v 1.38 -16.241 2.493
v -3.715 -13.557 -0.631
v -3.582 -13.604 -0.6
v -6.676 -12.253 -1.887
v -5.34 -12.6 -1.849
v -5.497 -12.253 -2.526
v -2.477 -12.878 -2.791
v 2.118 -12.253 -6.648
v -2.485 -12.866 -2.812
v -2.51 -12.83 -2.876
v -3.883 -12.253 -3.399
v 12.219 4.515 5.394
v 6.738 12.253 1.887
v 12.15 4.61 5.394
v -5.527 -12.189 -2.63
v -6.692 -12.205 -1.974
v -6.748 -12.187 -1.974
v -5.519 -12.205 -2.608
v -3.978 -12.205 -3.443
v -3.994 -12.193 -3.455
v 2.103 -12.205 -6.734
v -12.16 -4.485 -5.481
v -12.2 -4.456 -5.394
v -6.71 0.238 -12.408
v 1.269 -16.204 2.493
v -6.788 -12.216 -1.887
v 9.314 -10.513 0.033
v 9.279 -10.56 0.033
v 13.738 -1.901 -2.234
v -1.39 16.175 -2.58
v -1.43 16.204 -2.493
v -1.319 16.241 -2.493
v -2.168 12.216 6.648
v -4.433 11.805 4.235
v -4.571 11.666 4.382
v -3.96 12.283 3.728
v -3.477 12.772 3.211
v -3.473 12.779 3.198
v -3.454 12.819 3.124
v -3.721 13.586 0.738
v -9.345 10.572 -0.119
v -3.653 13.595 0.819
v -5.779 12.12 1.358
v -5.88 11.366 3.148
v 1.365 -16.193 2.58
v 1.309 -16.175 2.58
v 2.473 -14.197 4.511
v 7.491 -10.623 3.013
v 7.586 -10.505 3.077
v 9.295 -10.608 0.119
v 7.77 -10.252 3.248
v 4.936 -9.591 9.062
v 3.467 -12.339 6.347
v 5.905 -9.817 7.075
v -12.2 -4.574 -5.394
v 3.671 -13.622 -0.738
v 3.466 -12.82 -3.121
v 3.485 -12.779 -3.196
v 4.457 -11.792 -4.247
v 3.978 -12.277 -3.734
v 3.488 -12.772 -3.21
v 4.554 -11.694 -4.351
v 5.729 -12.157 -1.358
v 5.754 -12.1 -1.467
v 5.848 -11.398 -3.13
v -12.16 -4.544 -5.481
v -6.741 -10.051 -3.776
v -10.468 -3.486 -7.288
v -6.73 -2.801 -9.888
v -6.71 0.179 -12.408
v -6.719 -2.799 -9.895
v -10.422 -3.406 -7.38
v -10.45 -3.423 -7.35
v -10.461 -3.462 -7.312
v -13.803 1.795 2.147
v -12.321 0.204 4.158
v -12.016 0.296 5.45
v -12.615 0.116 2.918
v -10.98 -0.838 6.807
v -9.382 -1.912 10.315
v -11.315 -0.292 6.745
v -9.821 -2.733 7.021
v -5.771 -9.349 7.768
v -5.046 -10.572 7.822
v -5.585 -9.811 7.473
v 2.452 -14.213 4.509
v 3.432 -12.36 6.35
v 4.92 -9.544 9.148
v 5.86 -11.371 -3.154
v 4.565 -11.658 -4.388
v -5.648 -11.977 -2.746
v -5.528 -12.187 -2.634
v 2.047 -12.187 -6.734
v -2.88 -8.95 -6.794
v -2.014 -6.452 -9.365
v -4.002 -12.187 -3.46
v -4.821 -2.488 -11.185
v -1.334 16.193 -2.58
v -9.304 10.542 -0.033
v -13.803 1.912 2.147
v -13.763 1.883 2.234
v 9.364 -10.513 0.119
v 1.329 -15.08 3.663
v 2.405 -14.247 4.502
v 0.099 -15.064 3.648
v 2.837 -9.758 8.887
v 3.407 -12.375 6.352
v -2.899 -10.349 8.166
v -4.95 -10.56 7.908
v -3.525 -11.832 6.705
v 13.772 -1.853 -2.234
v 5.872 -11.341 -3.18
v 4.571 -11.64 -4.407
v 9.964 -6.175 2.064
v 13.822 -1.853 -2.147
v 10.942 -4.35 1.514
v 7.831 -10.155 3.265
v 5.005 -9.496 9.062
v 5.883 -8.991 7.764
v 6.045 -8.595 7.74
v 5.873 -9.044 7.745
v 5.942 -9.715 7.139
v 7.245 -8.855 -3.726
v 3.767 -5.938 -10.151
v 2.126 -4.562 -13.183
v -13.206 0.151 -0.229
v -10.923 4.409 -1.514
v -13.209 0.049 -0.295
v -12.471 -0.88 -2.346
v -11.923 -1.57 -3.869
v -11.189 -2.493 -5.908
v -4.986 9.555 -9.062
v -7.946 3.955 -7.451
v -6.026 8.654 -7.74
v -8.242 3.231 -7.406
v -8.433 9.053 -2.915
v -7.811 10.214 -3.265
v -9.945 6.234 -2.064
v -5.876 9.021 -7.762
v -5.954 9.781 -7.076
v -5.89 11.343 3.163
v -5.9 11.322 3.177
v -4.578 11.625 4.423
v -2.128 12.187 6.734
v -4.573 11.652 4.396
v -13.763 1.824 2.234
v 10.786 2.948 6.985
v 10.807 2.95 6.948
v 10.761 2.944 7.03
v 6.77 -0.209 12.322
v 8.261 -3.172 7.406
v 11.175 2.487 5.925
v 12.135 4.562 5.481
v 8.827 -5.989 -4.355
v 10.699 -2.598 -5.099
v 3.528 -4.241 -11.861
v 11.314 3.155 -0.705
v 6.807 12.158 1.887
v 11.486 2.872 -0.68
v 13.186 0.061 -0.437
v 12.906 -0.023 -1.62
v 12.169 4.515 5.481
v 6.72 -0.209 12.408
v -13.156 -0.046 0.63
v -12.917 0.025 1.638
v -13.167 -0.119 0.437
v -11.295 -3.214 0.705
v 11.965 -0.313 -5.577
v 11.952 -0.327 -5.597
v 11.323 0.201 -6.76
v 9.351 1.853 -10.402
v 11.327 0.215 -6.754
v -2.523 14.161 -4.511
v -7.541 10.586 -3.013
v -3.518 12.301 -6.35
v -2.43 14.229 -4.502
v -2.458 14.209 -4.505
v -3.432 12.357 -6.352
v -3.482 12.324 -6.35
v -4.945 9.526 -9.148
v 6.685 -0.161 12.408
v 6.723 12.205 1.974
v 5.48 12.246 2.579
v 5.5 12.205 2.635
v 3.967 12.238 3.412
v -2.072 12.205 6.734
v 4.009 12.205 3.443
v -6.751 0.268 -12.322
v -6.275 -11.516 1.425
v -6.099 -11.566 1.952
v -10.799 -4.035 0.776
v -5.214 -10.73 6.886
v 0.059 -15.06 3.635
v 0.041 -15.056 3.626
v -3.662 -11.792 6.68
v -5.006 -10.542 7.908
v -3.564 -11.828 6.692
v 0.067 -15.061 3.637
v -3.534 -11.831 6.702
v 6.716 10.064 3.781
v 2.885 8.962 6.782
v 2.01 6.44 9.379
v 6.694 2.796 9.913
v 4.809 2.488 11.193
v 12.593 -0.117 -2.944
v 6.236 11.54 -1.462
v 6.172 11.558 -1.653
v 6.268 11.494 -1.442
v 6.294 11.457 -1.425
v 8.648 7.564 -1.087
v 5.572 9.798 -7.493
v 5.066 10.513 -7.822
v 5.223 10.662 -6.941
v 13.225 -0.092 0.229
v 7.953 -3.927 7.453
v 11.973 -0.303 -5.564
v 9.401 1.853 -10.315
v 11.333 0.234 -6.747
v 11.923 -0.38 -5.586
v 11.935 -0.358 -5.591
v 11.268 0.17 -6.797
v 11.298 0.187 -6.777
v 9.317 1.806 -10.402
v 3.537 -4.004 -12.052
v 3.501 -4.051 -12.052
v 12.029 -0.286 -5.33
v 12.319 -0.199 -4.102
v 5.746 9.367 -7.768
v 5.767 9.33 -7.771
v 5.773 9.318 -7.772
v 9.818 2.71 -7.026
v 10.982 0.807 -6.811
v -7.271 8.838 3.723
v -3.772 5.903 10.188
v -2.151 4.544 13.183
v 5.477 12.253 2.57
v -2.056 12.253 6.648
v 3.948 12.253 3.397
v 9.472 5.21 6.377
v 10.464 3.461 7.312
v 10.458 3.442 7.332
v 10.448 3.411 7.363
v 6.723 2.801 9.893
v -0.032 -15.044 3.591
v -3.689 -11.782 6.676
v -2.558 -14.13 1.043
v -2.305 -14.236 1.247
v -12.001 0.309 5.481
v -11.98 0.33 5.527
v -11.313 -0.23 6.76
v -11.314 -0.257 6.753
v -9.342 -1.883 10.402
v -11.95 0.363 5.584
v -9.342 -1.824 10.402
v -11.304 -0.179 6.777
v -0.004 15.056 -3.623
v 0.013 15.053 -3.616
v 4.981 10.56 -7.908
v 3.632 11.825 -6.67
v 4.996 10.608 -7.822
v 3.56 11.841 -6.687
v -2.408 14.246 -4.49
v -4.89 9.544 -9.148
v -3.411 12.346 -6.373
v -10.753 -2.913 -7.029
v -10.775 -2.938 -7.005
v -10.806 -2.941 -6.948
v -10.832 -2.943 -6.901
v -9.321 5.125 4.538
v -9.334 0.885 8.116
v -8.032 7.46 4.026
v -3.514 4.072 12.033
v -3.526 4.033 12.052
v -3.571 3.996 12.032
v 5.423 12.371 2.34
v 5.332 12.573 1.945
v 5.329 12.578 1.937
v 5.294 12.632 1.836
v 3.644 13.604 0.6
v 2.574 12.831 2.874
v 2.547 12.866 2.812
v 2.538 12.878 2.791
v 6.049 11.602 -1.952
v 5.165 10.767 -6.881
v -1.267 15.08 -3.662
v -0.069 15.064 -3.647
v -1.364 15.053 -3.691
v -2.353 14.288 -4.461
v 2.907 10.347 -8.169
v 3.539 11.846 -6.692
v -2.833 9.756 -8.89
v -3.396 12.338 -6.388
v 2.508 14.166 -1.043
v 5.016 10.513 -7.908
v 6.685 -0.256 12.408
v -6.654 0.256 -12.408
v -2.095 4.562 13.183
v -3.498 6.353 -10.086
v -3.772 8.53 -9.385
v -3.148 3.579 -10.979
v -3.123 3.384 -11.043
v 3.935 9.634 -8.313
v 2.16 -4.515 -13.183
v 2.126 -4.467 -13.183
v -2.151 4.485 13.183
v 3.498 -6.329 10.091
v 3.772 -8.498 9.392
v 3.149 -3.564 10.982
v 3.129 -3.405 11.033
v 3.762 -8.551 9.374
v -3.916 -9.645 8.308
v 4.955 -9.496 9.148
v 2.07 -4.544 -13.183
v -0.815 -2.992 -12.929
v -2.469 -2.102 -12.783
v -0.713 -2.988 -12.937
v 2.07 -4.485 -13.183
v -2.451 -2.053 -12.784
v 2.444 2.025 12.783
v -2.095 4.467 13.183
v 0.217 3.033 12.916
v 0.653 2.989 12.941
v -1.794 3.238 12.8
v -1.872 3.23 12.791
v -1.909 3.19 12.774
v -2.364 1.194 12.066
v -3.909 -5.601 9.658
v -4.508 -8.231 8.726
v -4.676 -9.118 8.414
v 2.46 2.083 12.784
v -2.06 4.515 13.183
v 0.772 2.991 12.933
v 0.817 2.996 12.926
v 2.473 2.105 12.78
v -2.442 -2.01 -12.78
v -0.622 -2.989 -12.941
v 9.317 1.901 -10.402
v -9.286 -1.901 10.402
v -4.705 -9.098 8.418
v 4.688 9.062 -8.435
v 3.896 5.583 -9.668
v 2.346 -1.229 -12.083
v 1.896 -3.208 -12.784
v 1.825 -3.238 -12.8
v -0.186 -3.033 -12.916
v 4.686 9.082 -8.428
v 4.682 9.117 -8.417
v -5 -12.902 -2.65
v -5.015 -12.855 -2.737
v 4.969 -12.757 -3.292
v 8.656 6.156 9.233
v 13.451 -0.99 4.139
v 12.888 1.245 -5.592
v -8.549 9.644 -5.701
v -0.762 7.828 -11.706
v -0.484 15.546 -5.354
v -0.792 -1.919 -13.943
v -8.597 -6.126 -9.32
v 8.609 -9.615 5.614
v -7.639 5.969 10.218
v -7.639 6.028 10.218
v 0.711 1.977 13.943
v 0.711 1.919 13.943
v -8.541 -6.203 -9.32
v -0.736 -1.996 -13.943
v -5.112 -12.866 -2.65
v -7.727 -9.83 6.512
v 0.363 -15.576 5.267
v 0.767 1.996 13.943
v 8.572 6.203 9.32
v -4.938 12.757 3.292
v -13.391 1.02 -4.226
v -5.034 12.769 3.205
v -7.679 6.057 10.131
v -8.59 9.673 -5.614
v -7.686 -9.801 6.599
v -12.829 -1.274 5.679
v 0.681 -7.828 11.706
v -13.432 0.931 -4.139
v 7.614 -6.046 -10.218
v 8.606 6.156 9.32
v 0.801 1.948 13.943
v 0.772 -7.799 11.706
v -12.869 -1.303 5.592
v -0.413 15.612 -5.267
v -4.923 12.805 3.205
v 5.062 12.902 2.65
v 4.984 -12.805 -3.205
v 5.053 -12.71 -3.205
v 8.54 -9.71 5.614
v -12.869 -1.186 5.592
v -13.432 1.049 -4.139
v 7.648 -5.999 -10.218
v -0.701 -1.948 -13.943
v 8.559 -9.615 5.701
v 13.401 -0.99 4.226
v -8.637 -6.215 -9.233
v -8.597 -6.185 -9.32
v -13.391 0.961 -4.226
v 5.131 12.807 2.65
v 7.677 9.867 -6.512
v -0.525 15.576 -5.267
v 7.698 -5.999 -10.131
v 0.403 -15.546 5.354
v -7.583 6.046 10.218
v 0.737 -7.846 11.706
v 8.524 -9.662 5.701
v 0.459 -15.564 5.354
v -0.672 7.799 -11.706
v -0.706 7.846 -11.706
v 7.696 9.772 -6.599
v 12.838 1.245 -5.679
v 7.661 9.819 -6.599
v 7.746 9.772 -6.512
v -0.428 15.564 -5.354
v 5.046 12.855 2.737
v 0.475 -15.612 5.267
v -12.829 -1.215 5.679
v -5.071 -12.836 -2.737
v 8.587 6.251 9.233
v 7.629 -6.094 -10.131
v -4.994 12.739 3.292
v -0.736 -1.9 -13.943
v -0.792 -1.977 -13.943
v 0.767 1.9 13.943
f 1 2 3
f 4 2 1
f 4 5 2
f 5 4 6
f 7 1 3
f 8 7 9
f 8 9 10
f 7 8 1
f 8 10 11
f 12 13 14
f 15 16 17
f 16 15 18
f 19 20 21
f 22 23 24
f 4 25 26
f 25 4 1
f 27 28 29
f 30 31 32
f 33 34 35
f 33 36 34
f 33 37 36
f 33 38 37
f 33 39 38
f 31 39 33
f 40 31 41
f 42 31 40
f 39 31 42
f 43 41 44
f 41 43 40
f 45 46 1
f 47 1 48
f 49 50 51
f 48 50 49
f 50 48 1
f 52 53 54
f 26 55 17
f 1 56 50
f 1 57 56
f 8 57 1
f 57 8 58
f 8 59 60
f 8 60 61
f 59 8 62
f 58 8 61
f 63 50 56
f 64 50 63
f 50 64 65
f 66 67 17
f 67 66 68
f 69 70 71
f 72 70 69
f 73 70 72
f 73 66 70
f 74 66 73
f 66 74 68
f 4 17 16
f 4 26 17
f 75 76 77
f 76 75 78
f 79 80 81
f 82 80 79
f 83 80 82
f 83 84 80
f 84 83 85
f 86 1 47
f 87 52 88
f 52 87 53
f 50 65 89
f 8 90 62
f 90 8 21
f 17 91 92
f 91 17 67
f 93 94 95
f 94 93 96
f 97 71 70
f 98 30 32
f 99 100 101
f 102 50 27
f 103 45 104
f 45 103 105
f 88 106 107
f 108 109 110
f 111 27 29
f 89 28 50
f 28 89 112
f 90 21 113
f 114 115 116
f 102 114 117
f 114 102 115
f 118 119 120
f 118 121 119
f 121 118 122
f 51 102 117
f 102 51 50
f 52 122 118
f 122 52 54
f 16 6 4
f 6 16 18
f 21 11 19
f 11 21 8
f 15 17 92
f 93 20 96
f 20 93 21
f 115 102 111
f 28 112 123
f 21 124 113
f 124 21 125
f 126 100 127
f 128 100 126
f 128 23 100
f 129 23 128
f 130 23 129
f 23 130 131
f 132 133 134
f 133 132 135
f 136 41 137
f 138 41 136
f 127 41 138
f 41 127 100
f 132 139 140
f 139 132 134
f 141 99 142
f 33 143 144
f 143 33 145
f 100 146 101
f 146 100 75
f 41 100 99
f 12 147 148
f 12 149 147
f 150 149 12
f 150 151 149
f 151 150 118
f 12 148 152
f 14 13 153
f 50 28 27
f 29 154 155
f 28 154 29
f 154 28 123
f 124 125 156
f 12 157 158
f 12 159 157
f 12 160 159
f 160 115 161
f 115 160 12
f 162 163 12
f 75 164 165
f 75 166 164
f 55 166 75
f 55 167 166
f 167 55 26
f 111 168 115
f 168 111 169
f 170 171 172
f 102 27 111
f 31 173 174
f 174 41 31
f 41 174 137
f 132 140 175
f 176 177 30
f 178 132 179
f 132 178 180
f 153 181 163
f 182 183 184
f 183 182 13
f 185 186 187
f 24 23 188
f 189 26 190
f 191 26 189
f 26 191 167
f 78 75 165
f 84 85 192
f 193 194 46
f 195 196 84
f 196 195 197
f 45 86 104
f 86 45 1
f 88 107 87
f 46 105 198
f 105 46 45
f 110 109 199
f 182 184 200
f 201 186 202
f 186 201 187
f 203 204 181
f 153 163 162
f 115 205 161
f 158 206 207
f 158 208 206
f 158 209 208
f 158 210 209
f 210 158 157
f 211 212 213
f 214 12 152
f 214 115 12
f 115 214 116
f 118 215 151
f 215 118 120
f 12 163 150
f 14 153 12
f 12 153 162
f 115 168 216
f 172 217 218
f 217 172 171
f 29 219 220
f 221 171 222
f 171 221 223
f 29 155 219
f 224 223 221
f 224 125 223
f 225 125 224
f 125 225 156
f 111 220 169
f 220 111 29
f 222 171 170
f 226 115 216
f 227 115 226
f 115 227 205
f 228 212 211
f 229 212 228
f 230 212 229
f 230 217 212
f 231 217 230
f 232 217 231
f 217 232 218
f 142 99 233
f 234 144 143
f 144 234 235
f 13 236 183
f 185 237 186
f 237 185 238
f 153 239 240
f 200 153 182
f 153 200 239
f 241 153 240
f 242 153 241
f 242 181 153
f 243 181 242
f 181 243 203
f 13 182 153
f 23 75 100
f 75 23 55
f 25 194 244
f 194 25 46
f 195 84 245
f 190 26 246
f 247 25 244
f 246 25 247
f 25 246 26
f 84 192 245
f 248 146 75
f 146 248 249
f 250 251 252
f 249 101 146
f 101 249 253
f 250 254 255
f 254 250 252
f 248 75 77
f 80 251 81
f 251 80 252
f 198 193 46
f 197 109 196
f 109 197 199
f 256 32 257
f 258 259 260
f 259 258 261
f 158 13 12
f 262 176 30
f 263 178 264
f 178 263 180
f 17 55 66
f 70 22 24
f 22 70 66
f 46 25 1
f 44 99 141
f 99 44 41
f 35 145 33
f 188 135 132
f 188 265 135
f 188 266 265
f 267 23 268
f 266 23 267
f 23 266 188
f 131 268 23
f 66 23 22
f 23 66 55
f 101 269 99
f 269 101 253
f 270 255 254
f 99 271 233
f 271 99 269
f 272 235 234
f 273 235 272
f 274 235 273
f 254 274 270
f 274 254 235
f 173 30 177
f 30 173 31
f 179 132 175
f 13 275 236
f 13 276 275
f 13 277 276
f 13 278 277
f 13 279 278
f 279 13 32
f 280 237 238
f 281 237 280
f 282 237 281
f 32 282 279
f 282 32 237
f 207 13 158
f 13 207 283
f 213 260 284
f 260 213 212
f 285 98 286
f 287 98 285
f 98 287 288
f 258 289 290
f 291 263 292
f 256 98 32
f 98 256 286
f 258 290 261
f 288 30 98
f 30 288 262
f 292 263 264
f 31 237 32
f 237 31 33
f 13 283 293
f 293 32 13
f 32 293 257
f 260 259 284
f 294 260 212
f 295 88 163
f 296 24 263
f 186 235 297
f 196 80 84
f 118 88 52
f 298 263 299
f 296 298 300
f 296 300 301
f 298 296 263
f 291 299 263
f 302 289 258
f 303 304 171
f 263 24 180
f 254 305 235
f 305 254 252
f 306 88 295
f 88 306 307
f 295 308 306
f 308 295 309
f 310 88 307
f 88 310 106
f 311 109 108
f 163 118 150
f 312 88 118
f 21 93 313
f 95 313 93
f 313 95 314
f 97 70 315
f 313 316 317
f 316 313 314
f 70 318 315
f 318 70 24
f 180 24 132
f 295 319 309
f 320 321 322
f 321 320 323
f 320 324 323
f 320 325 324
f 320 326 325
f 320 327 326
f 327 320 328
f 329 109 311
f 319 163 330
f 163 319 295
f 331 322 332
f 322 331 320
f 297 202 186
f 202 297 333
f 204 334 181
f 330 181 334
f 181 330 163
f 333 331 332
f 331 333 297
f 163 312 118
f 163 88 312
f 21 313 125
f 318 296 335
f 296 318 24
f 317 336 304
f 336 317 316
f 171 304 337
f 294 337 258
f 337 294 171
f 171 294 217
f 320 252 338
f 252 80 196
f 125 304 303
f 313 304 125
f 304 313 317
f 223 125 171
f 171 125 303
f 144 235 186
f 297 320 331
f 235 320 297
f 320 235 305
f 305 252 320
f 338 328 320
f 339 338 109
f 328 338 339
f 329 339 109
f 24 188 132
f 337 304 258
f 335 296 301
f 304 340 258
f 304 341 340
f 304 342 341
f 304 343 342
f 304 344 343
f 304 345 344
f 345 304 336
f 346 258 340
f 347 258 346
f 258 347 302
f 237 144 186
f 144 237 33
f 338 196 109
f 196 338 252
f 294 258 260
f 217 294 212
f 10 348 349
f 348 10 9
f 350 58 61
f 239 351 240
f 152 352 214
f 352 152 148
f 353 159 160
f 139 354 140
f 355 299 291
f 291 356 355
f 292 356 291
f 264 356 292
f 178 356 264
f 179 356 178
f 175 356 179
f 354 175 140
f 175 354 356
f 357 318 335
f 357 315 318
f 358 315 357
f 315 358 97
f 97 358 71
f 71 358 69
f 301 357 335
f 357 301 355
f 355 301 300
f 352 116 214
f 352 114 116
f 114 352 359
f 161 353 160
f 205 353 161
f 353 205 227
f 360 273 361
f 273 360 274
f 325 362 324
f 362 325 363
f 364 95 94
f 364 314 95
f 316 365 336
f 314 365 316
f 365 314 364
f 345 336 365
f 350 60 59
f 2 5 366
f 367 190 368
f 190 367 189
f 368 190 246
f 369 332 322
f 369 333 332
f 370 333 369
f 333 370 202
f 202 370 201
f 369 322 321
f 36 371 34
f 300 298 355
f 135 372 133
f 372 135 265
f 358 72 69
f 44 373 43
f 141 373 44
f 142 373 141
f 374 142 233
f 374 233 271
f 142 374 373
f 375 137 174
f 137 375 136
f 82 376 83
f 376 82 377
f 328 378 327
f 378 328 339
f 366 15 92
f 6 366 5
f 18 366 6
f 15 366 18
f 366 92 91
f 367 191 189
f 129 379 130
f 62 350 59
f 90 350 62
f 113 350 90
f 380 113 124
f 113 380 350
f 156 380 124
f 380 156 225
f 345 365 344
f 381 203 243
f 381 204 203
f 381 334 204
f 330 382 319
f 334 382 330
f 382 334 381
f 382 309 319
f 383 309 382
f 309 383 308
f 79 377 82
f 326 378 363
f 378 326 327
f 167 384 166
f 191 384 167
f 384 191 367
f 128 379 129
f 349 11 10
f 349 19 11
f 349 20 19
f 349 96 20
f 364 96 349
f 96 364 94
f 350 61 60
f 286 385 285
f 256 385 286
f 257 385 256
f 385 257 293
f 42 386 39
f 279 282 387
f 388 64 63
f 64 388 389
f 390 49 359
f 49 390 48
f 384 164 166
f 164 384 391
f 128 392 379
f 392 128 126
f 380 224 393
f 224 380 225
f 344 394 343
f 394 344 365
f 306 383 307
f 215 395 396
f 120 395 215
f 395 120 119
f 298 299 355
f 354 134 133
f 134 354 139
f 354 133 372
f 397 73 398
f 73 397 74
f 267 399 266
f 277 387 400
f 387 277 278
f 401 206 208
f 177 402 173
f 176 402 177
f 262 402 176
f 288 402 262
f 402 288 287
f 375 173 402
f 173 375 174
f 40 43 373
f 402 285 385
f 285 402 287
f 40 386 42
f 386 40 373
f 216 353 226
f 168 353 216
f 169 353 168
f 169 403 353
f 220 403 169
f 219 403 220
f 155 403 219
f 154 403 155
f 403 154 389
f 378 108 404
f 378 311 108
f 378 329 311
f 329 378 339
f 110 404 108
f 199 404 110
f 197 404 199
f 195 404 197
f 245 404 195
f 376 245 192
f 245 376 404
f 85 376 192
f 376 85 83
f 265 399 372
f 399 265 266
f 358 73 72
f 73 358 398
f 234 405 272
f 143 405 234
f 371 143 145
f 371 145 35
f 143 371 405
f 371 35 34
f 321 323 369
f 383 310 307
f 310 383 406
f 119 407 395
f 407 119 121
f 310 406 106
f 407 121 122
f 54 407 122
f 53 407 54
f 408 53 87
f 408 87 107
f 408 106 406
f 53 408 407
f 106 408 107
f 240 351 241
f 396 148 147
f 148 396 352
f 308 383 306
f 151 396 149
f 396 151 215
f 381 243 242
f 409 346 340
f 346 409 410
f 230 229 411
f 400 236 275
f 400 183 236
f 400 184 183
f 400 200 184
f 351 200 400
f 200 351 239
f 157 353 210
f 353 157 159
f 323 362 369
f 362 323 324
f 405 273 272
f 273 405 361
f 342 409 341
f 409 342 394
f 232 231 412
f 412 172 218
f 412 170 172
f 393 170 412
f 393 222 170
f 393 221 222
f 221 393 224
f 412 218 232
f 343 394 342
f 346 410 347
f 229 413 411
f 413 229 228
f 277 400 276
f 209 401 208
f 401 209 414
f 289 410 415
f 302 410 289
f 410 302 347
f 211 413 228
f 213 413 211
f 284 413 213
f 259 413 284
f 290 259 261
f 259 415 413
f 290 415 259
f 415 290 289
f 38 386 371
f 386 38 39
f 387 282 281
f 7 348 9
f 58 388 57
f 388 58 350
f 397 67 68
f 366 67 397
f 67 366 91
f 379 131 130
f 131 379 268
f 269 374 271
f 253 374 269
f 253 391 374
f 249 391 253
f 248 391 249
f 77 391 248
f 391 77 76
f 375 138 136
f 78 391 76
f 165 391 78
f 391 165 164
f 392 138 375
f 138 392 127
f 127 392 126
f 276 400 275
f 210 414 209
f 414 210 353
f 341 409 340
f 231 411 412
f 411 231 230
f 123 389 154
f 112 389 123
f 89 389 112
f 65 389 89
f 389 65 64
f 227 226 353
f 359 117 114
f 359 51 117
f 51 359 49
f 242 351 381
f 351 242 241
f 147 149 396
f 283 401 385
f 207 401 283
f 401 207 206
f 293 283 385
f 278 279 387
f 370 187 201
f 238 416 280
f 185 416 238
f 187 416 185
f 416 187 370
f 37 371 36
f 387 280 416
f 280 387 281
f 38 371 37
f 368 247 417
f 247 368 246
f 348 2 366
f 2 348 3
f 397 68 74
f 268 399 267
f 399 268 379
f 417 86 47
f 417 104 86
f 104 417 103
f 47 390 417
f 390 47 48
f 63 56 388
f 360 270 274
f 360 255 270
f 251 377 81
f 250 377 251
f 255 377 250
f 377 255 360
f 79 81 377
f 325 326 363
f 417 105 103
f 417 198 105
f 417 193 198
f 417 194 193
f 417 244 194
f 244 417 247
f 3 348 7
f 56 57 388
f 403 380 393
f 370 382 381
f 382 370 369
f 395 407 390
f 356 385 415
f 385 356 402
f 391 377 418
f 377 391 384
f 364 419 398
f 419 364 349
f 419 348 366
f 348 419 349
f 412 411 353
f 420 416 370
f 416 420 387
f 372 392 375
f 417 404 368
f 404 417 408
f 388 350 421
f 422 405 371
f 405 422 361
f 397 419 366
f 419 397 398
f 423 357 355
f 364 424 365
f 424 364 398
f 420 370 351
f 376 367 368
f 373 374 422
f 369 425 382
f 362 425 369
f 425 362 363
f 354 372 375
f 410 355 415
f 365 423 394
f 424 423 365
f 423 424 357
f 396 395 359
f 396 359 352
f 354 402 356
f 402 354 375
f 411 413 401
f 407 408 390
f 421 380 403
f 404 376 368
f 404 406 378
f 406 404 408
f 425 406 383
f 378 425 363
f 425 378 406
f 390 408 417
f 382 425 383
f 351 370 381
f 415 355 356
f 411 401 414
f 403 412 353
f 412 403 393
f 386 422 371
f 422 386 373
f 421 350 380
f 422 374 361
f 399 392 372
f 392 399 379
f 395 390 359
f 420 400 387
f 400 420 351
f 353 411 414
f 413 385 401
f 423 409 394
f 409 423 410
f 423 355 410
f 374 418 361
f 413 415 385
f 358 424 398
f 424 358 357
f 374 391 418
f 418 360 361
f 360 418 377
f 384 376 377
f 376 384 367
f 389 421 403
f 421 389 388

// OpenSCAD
// Auto-generated OpenSCAD file

    inner_points = 10*[[-1.3350698747901557, 0.0990218864340161, -0.41389441527673243], [0.8508637948042702, -0.9614534950051333, 0.5613942208431721], [-0.8508637948042702, 0.9614534950051333, -0.5613942208431721], [1.3350698747901557, -0.0990218864340161, 0.41389441527673243], [-0.07512626496626917, -0.194799963559733, -1.385617014211274], [0.7598260996660189, -0.5998655150369786, -1.013089904054999], [-0.7598260996660189, 0.5998655150369786, 1.013089904054999], [0.07512626496626917, 0.194799963559733, 1.385617014211274], [-0.5030679550992645, -1.280705233674586, -0.26503250471063], [0.7646000198631342, 0.9771700305368443, -0.6511920090175702], [-0.7646000198631342, -0.9771700305368443, 0.6511920090175702], [0.5030679550992645, 1.280705233674586, 0.26503250471063], [-0.8556377150013853, -0.6155820505686895, -0.9232921158806008], [0.4953435899607525, -1.2709918805305933, -0.3205305899169714], [-0.07217582002487244, 0.7798616050716232, -1.1619518146211012], [1.2788054849372654, 0.12445177510971961, -0.5591902886574719], [-1.2788054849372654, -0.12445177510971961, 0.5591902886574719], [0.07217582002487244, -0.7798616050716232, 1.1619518146211012], [-0.4953435899607525, 1.2709918805305933, 0.3205305899169714], [0.8556377150013853, 0.6155820505686895, 0.9232921158806008], [0.0443746617590165, -1.5516849543996245, 0.5267228692547999], [-0.0443746617590165, 1.5516849543996245, -0.5267228692547999]];

    outer_points = 10*[[0.6669622706403558, -0.020873051468661752, 1.2321733387908815], [-0.49050024063185305, 0.9496265660238541, -0.9061701775076568], [0.49050024063185305, -0.9496265660238541, 0.9061701775076568], [-0.6669622706403558, 0.020873051468661752, -1.2321733387908815], [1.372245669008736, -0.18534893390668453, -0.2147395821660355], [0.9301343304065605, 0.18534893390668453, -1.0315141257691125], [-0.9301343304065605, -0.18534893390668453, 1.0315141257691125], [-1.372245669008736, 0.18534893390668453, 0.2147395821660355], [0.6707072485223723, 1.215754134138207, 0.18873039942687714], [0.20872365623630781, -1.215754134138207, -0.6647569572525192], [-0.20872365623630781, 1.215754134138207, 0.6647569572525192], [-0.6707072485223723, -1.215754134138207, -0.18873039942687714], [1.2119109148021057, 0.4514765020210374, 0.5394130089910635], [0.4965597421320721, 1.0512782517001842, -0.782155963704398], [0.926389352524544, -1.0512782517001842, 0.011928813594892007], [0.21103817985451057, -0.4514765020210374, -1.3096401591005695], [-0.21103817985451057, 0.4514765020210374, 1.3096401591005695], [-0.926389352524544, 1.0512782517001842, -0.011928813594892007], [-0.4965597421320721, -1.0512782517001842, 0.782155963704398], [-1.2119109148021057, -0.4514765020210374, -0.5394130089910635], [-0.1349496014656266, 1.6145478368697694, -0.24931140534644022], [0.1349496014656266, -1.6145478368697694, 0.24931140534644022]];

    // Convex hull for inner set (I)
    module inner_hull() {
        hull() {
            for (p = inner_points) {
                translate(p) sphere(r=0.1);
            }
        }
    }

    // Convex hull for outer set (O) minus inner hull (O \ I)
    module outer_minus_inner() {
        difference() {
            hull() {
                for (p = outer_points) {
                    translate(p) sphere(r=0.1);
                }
            }
            inner_hull(); // Subtract inner hull
        }
    }

    // Convex hull for outer set (O) minus all translated inner hulls
    module outer_minus_AllTranslationInner() {
        difference() {
            hull() {
                for (p = outer_points) {
                    translate(p) sphere(r=0.1);
                }
            }
            hull() {
                translate([0,0,50]) inner_hull();
                translate([0,0,-50]) inner_hull();
            }; // Subtract translated inner hulls
        }
    }

    // Difference between outer_minus_inner and outer_minus_AllTranslationInner
    module outer_minus_inner_diff() {
        difference() {
            // Outer minus inner
            difference() {
                hull() {
                    for (p = outer_points) {
                        translate(p) sphere(r=0.1);
                    }
                }
                inner_hull();
            }

            // Subtract Outer minus AllTranslationInner
            difference() {
                hull() {
                    for (p = outer_points) {
                        translate(p) sphere(r=0.1);
                    }
                }
                hull() {
                    translate([0,0,50]) inner_hull();
                    translate([0,0,-50]) inner_hull();
                };
            }
        }
    }

    // Rendering all with colors applied
    color([1, 0, 0, 0.5]) inner_hull(); // Transparent red
    color([0, 1, 0, 1]) outer_minus_AllTranslationInner(); // Opaque green
    color([1, 1, 0, 1]) outer_minus_inner_diff(); // Opaque yellow
    
